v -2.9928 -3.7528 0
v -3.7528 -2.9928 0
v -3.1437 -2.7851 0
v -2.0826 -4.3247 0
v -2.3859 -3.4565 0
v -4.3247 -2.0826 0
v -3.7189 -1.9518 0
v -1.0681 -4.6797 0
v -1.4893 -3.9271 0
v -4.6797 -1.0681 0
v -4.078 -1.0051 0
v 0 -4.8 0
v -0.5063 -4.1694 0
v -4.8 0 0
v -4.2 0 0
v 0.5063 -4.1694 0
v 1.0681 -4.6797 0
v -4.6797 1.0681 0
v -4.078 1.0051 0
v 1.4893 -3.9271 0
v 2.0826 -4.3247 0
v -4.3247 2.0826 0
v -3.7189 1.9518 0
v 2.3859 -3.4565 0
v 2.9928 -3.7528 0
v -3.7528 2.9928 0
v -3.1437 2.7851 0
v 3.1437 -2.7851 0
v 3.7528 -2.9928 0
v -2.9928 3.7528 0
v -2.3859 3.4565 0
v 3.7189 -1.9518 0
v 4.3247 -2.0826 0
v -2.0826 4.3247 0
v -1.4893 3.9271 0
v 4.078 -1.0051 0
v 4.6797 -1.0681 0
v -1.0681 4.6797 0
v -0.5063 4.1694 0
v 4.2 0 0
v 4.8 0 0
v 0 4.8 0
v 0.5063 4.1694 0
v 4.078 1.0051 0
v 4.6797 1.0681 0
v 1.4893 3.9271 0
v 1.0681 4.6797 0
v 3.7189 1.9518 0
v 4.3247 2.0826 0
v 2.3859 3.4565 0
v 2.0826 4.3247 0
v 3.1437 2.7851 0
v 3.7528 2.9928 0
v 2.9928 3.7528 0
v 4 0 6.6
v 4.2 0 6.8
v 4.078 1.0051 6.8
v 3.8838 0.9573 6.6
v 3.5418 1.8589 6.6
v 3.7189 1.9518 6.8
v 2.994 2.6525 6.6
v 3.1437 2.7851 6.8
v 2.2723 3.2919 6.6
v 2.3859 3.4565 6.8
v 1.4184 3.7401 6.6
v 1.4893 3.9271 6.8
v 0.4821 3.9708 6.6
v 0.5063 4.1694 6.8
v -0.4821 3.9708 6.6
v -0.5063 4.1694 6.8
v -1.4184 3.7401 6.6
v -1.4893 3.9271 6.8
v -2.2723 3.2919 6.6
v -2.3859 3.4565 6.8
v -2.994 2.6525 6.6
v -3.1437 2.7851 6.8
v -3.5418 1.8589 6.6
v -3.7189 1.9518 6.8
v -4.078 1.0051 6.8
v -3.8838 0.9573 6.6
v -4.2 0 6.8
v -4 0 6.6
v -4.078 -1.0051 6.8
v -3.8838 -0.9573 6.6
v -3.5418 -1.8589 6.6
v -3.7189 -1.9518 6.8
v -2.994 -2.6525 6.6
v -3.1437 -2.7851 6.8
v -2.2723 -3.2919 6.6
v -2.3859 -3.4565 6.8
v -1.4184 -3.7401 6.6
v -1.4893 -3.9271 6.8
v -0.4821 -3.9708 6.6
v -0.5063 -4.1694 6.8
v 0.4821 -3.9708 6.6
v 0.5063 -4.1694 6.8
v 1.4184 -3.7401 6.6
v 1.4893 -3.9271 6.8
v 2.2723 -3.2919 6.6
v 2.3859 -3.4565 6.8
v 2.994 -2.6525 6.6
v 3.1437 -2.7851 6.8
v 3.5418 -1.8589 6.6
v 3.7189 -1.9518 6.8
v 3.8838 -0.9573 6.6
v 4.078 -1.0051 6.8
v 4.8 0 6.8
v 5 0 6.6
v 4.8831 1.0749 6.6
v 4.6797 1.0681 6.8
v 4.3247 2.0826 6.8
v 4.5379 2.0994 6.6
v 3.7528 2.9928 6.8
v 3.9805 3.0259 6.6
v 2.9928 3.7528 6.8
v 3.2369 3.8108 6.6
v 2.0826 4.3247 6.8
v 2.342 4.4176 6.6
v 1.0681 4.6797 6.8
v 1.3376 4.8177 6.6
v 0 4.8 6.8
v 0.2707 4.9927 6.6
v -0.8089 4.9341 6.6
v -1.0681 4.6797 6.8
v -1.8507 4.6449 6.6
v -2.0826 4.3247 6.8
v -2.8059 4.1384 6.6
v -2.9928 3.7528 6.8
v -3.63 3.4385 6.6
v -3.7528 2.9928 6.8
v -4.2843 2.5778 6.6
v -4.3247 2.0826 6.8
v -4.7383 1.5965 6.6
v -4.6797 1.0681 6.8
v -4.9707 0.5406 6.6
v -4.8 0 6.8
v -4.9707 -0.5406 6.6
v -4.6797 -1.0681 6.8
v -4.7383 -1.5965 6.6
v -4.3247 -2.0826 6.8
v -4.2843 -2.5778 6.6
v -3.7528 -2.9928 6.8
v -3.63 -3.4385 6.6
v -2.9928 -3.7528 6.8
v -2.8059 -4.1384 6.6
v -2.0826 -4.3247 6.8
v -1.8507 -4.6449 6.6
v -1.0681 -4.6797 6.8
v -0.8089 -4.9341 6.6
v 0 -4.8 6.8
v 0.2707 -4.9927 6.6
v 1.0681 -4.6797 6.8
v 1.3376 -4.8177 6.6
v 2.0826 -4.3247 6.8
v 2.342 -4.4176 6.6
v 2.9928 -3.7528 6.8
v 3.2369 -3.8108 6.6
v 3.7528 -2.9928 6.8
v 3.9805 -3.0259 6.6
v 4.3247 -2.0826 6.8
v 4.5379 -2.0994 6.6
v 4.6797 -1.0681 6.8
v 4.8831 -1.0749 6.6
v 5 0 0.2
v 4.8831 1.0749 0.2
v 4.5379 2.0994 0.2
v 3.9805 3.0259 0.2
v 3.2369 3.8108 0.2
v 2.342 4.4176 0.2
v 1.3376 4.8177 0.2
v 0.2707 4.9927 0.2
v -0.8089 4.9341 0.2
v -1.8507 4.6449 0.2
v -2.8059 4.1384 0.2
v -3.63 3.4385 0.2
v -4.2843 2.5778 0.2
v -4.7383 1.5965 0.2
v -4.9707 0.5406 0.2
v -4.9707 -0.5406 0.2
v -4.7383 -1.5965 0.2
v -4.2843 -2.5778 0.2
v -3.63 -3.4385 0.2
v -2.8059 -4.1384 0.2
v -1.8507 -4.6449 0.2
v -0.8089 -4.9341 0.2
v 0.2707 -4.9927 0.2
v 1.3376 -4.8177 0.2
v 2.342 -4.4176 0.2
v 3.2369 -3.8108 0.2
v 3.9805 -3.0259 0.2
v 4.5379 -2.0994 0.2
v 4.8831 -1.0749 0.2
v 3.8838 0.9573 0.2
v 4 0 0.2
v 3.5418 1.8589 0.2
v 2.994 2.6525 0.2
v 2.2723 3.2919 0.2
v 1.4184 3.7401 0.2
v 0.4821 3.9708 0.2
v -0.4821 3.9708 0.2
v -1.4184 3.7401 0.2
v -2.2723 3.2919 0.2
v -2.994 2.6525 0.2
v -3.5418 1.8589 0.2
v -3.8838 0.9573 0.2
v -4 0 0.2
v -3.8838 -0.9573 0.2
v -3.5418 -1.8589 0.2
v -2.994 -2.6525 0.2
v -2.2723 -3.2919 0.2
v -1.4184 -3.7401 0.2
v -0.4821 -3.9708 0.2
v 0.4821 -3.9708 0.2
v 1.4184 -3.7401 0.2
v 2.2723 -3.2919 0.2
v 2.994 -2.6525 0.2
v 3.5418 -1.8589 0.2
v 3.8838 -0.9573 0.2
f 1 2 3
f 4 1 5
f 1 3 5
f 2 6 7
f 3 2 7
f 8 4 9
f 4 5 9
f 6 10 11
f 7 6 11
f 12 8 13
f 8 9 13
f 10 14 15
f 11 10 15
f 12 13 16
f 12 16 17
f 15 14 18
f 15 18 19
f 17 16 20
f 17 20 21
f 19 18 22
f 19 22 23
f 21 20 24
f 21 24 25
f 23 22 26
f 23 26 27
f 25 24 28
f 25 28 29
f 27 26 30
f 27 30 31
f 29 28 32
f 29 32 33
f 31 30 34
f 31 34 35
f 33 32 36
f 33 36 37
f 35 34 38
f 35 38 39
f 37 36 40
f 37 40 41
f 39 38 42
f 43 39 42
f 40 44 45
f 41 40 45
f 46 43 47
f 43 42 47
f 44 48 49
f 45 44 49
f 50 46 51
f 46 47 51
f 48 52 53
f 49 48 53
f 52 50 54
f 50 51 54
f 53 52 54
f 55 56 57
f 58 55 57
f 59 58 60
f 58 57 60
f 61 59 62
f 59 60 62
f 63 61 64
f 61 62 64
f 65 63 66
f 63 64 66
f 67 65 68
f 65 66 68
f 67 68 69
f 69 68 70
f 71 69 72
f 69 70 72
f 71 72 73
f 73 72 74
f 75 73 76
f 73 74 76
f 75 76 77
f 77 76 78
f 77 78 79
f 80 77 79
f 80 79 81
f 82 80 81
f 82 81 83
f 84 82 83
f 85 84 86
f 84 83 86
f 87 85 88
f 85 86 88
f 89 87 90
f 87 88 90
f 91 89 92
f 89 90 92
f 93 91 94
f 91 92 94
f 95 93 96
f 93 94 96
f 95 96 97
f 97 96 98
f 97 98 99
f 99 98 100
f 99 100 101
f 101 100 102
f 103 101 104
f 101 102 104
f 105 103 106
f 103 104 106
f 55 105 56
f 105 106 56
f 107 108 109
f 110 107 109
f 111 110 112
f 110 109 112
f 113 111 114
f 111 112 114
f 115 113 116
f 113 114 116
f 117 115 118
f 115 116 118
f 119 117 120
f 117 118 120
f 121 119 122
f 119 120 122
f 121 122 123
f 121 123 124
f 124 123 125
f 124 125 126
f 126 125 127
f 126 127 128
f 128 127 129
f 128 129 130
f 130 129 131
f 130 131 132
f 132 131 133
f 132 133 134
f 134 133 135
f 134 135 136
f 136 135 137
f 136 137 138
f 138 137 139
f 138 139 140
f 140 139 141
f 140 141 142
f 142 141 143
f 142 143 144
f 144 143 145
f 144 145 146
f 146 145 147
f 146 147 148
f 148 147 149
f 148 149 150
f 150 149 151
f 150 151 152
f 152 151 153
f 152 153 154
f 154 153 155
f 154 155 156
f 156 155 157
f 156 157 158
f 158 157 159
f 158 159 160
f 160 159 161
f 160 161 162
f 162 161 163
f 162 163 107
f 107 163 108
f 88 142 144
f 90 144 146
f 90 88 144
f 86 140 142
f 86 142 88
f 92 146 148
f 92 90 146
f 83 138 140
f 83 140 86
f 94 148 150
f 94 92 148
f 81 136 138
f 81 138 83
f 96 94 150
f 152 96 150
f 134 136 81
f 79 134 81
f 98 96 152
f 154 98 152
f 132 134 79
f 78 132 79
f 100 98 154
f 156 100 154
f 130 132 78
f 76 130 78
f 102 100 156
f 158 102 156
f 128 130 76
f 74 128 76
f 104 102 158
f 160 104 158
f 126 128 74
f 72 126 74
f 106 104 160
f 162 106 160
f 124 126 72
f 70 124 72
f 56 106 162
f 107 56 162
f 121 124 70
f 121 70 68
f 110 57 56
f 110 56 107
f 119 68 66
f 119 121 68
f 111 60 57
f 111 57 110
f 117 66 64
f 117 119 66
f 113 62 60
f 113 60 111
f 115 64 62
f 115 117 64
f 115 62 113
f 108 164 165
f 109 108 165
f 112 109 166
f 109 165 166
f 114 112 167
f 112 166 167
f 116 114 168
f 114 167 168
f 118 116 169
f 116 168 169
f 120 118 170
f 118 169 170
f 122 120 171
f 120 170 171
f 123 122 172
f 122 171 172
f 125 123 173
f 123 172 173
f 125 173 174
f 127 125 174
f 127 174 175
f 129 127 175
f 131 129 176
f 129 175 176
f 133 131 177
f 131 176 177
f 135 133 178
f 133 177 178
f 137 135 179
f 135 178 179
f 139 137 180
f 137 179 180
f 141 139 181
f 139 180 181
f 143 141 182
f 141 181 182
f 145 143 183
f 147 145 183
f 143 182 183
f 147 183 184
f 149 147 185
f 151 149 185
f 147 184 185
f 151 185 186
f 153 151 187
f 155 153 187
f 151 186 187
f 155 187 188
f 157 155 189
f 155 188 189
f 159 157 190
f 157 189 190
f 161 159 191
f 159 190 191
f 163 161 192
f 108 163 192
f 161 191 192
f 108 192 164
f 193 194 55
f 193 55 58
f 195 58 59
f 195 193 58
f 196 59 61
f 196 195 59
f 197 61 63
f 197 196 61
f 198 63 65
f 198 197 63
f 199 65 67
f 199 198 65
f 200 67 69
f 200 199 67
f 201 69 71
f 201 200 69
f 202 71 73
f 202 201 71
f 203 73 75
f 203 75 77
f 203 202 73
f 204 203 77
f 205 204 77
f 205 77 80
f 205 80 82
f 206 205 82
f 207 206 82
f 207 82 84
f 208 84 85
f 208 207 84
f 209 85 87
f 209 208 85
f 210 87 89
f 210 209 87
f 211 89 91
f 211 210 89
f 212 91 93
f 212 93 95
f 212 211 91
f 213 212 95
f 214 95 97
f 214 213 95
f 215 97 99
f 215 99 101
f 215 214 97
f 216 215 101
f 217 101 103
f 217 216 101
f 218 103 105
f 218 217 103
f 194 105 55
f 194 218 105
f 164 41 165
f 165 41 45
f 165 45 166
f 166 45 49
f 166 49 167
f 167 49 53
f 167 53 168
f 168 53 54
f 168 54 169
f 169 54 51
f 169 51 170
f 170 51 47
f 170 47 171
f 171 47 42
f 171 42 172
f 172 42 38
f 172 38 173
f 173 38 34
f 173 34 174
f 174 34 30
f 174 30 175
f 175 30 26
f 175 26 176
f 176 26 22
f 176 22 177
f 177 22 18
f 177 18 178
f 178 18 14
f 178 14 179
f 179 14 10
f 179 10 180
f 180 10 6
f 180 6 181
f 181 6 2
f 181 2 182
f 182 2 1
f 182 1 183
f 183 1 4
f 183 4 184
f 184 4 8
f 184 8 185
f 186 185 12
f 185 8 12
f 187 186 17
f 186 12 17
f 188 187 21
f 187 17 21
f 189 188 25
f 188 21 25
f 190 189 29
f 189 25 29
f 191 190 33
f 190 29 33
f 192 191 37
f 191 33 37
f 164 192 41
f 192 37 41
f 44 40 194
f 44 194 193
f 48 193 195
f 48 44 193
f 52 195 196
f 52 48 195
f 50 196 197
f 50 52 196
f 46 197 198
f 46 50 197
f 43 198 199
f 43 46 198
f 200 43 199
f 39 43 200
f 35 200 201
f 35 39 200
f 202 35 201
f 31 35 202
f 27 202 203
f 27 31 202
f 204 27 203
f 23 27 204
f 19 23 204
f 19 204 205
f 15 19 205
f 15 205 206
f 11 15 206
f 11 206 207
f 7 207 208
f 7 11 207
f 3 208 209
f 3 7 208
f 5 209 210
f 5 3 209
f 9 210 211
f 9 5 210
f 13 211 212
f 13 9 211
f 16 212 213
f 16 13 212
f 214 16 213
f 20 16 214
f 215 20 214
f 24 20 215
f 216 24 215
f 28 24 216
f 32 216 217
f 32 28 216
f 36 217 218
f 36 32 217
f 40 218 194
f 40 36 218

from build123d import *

# Parameters (mm, degrees)
F0_R     = 5
F0_R_2   = 4
F1_DEPTH = 6.8
F2_SIZE  = 0.2
F3_SIZE  = 0.2
F4_SIZE  = 0.2


with BuildPart() as f1:
    # F0 (on Top) → F1 (new body)
    with BuildSketch(Plane.XY):
        Circle(F0_R)
        Circle(F0_R_2, mode=Mode.SUBTRACT)
    extrude(amount=F1_DEPTH)

    # F2
    f2_edges = [f1.edges().sort_by_distance(p)[0] for p in [
        (-4, 0, 6.8),
    ]]
    chamfer(f2_edges, length=F2_SIZE)

    # F3
    f3_edges = [f1.edges().sort_by_distance(p)[0] for p in [
        (-5, 0, 6.8),
    ]]
    chamfer(f3_edges, length=F3_SIZE)

    # F4
    f4_edges = [f1.edges().sort_by_distance(p)[0] for p in [
        (-5, 0, 0),
        (-4, 0, 0),
    ]]
    chamfer(f4_edges, length=F4_SIZE)


solid = f1.part
